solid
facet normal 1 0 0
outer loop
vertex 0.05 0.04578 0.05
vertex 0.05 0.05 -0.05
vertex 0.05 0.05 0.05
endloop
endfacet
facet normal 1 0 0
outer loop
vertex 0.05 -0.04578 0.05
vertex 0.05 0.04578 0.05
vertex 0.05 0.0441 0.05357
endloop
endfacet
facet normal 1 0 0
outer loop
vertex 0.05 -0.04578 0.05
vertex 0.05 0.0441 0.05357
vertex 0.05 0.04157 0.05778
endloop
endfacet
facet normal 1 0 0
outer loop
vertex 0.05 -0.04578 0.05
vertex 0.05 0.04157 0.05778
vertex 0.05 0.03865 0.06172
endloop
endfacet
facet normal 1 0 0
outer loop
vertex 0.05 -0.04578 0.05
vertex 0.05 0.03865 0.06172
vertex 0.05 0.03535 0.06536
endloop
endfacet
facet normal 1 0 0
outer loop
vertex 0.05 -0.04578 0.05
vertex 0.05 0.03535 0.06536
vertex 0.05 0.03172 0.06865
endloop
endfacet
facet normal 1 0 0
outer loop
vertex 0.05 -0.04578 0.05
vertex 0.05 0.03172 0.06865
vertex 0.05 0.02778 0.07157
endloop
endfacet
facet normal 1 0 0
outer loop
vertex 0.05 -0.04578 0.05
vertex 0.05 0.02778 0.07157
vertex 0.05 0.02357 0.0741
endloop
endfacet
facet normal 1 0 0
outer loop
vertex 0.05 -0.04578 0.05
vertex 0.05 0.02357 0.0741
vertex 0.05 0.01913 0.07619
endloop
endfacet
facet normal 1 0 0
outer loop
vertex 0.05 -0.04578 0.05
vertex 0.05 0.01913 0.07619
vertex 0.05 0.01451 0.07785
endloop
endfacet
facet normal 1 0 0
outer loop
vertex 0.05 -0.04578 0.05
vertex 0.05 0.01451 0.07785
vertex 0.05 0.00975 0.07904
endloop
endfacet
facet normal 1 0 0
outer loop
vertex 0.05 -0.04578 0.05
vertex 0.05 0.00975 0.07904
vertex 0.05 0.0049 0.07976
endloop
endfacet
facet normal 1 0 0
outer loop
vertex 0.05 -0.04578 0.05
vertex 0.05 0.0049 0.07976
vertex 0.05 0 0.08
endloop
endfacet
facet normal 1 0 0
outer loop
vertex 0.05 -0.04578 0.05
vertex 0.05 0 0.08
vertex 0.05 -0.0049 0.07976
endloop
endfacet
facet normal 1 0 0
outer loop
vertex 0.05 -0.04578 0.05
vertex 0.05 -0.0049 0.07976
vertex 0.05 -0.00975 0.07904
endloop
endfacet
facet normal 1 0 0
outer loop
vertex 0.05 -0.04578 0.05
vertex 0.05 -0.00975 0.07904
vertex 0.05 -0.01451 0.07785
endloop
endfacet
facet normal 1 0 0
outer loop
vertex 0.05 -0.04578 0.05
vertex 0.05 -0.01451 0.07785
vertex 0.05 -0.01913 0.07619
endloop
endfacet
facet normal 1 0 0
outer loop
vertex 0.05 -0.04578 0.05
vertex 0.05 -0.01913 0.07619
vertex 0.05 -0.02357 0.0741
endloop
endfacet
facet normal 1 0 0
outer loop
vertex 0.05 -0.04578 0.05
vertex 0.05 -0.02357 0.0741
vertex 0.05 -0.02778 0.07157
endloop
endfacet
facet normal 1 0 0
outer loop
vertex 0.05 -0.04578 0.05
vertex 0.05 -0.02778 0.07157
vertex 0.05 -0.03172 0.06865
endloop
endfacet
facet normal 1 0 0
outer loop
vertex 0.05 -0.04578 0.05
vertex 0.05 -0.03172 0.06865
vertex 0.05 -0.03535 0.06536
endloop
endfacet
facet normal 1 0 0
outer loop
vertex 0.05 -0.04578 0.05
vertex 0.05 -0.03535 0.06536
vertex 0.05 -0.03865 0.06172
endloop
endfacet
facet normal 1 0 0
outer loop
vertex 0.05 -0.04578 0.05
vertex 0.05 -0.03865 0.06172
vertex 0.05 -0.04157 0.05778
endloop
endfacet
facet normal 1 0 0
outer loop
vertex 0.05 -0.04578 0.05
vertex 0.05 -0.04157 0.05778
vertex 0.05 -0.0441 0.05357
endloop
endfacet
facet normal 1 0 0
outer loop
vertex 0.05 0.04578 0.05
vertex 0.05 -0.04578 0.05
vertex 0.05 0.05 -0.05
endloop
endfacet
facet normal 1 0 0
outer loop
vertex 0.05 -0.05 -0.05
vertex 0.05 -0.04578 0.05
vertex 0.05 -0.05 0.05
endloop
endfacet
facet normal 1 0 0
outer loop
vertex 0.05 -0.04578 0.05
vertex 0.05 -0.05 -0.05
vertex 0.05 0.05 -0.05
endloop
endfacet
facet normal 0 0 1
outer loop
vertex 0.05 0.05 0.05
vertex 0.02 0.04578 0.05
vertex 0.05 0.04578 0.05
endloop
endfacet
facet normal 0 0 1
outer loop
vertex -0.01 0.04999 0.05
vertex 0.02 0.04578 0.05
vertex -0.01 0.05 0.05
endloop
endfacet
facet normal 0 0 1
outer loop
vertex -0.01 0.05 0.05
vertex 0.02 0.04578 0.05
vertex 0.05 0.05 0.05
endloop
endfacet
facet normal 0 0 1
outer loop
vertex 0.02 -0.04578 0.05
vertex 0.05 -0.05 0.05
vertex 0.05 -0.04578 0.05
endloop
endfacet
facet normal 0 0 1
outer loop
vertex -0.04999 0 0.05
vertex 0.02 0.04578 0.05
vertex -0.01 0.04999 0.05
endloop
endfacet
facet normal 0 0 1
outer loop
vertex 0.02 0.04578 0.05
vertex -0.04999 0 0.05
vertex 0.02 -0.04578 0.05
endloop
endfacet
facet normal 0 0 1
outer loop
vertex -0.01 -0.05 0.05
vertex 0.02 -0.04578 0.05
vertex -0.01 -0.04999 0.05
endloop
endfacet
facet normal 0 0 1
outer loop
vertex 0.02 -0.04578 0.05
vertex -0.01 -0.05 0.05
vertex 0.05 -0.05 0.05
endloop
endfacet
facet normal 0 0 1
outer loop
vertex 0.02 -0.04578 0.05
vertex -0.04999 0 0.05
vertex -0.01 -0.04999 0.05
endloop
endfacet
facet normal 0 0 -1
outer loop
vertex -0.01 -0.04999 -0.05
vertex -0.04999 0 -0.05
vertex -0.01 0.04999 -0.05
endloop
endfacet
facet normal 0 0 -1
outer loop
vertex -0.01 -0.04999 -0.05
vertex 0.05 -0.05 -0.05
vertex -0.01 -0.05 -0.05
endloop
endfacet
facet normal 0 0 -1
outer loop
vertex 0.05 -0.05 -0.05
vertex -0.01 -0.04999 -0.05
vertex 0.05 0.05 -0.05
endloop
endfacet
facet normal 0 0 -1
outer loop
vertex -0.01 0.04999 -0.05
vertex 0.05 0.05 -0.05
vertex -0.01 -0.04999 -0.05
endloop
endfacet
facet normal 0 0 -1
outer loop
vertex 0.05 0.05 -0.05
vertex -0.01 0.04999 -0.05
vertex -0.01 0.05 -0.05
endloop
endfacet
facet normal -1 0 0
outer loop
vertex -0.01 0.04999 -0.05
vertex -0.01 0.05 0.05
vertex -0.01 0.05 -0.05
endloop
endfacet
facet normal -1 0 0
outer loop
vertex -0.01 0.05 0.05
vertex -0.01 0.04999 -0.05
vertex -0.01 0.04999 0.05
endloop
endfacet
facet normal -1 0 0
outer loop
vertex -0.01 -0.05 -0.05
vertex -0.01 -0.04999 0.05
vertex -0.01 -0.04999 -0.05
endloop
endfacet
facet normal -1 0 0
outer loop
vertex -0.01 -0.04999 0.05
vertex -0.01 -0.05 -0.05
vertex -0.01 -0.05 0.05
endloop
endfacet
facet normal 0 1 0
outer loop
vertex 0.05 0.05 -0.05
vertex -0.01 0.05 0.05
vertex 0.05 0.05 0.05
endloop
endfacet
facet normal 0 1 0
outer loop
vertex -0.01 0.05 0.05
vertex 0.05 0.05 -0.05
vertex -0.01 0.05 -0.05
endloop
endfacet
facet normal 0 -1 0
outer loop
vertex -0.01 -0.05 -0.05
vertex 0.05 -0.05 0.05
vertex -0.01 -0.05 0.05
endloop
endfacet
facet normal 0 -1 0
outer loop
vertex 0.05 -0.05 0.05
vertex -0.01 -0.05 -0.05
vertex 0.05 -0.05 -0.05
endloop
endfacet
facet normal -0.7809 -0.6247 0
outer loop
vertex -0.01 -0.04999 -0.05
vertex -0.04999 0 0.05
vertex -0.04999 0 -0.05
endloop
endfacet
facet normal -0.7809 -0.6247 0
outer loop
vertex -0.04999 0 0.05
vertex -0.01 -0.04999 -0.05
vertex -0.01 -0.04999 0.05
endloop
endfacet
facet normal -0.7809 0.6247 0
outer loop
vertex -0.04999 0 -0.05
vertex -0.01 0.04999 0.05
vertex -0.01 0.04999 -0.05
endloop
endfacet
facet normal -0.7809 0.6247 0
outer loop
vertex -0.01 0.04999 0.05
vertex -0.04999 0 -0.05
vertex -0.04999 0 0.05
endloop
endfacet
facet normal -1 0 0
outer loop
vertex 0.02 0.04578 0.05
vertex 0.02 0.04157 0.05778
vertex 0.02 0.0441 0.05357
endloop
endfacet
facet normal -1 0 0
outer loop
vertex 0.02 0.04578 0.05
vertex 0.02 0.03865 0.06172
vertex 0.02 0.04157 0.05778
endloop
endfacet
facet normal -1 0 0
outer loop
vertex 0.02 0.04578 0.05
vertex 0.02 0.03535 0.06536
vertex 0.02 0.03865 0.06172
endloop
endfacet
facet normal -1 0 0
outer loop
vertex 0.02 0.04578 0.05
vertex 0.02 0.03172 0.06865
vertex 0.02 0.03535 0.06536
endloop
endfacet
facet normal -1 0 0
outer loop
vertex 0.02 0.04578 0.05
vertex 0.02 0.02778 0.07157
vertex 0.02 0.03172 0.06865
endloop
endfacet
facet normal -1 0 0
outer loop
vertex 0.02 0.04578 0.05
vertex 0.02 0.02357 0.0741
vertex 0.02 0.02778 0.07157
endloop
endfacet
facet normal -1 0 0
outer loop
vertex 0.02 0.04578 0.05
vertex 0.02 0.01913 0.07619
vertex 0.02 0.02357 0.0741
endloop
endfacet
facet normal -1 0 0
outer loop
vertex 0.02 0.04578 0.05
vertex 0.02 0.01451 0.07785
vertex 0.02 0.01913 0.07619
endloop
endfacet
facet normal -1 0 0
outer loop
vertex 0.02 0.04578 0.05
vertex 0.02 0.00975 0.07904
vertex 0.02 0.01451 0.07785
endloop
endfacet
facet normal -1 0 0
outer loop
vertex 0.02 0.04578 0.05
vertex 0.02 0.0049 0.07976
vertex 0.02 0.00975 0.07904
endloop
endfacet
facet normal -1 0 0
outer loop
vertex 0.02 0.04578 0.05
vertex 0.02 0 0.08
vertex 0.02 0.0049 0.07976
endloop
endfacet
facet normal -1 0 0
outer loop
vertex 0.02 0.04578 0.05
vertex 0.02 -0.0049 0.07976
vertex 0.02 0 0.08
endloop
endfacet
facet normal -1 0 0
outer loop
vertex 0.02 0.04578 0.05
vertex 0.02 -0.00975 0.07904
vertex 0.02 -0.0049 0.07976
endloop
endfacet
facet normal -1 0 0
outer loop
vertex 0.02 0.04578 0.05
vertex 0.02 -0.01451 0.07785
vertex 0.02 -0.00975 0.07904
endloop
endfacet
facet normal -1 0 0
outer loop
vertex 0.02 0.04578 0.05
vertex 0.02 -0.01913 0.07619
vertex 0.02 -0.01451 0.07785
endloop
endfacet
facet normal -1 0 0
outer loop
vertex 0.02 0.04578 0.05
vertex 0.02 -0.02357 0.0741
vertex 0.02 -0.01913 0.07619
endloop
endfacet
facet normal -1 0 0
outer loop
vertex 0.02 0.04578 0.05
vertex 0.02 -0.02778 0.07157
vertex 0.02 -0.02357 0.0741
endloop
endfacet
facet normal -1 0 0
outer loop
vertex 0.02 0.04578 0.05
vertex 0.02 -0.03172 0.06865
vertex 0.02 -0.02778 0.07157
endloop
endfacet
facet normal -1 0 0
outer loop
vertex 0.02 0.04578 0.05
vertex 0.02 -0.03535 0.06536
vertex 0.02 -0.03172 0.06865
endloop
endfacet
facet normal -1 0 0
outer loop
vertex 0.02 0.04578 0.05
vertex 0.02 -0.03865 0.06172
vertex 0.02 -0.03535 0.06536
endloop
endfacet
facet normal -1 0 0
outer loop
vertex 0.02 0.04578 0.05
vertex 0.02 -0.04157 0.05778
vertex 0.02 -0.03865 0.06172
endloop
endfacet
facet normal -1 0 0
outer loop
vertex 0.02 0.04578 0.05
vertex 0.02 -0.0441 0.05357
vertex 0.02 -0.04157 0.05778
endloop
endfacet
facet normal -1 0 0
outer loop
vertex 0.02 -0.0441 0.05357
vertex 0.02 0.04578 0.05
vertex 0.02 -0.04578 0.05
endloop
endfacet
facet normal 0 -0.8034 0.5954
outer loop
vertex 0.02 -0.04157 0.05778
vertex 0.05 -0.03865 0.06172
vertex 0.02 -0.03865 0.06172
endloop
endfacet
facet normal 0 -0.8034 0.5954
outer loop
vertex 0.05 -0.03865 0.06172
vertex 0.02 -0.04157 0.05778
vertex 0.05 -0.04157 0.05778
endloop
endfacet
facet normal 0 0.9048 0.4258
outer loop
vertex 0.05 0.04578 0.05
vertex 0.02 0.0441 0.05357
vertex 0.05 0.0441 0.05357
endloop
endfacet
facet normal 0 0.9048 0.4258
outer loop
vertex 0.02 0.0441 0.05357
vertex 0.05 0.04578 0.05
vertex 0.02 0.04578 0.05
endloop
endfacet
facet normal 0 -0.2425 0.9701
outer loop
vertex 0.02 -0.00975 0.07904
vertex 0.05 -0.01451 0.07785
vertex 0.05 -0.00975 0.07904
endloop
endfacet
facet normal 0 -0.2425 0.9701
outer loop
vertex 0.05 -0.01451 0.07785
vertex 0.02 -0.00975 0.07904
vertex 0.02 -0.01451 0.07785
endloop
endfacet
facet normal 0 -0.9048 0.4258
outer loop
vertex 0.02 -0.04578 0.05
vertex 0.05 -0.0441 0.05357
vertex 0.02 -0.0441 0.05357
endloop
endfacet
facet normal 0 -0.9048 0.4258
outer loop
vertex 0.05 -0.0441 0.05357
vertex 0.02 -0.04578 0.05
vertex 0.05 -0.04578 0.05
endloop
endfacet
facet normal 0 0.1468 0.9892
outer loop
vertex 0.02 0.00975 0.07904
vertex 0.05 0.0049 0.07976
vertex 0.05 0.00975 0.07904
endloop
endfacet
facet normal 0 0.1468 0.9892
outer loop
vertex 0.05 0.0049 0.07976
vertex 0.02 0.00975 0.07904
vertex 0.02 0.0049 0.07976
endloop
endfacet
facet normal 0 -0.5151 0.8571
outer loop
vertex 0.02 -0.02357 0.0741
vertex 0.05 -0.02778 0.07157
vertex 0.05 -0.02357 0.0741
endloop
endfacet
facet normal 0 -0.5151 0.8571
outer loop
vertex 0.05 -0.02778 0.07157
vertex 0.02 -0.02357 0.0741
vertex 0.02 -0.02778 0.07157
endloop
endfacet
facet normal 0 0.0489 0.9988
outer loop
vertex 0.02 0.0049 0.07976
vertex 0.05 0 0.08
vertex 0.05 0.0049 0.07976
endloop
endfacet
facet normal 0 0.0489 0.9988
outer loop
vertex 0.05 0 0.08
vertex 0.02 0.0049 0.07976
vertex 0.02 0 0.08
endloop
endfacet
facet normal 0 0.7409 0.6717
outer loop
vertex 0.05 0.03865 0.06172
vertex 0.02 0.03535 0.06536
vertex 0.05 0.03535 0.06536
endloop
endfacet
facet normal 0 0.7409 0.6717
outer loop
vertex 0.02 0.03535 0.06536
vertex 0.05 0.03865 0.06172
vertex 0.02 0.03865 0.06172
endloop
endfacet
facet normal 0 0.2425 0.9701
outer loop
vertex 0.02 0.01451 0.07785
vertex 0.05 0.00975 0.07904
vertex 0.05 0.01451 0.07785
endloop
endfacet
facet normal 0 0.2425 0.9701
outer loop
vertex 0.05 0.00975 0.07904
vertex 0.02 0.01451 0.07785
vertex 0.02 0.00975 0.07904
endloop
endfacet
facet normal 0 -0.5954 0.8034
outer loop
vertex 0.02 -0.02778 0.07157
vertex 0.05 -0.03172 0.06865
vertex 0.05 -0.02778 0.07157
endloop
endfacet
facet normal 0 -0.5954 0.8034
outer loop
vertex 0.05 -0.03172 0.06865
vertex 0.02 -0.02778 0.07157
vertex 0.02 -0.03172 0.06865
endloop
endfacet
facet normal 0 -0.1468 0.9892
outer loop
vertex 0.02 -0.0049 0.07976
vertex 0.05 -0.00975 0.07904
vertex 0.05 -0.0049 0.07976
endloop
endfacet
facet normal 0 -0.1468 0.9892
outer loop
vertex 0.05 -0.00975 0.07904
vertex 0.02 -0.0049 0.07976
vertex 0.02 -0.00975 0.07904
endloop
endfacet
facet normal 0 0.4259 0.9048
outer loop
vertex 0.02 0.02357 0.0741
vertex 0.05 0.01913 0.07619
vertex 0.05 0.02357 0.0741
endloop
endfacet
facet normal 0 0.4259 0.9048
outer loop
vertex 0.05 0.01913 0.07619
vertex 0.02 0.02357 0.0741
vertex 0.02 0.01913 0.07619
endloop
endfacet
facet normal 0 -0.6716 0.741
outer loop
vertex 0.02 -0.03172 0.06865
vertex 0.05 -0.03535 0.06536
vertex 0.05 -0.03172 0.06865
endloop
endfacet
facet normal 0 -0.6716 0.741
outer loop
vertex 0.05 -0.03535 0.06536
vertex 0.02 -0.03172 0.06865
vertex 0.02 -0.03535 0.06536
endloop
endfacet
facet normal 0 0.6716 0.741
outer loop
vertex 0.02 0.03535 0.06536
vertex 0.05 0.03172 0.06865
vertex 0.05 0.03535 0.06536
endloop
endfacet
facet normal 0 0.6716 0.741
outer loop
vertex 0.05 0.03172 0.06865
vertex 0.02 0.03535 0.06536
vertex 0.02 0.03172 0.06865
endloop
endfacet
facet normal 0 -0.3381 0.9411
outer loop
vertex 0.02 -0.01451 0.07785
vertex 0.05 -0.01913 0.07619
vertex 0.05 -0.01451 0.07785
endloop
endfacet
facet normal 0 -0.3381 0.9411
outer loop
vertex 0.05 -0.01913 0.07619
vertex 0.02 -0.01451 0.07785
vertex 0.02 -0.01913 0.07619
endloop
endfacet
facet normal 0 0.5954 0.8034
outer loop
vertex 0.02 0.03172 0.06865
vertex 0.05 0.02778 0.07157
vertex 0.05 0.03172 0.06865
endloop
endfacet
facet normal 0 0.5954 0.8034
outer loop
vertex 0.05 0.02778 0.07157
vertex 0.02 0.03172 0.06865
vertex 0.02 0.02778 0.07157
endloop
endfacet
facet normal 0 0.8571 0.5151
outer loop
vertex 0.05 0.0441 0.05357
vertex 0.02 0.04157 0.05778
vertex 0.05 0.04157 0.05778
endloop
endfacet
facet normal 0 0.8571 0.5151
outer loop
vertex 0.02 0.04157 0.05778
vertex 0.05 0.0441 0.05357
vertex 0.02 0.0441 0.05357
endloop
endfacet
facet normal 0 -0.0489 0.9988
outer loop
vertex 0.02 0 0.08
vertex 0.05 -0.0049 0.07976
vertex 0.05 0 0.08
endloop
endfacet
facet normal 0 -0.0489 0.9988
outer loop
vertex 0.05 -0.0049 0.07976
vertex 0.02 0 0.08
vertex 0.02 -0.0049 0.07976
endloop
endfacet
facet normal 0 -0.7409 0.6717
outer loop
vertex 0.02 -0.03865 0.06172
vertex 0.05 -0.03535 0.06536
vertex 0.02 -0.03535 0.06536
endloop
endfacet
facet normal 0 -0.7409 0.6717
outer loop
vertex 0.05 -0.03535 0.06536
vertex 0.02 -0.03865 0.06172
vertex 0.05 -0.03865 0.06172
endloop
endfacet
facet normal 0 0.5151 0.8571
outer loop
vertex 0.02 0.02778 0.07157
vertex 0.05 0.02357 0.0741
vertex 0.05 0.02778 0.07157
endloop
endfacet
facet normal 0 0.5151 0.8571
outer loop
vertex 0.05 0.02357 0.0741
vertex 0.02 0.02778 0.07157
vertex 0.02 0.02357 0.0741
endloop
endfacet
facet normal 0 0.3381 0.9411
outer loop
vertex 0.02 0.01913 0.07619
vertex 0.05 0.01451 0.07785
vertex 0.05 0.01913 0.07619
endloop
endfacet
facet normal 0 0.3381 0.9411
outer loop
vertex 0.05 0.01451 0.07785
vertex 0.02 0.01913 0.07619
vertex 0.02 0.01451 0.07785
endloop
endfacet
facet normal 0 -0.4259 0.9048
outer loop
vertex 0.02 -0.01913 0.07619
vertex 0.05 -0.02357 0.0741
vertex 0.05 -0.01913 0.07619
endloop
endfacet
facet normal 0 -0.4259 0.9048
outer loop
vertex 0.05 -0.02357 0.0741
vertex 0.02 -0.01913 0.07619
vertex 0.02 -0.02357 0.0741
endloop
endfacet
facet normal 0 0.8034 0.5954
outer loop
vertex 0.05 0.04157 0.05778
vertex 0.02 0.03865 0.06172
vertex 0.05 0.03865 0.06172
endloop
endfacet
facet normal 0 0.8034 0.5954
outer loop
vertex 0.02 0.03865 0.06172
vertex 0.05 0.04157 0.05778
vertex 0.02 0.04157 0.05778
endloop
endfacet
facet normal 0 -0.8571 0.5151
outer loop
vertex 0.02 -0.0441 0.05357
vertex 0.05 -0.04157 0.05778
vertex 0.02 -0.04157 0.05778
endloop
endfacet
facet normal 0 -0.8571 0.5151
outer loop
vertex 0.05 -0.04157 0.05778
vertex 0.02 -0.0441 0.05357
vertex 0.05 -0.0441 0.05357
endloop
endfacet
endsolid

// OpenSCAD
$fn=64;

L = 0.1;
W = 0.1;
H = 0.1;

wedge_len = 0.04;
body_len  = L - wedge_len;

clevis_len = 0.03;
arm_thk = 0.02;
gap_w = 0.03;
arm_h = 0.06;

module wedge_body(len_body, len_wedge, w, h){
    union(){
        translate([-(L/2) + len_wedge + len_body/2, 0, 0])
            cube([len_body, w, h], center=true);

        translate([-(L/2) + len_wedge, 0, 0])
            linear_extrude(height=h, center=true)
                polygon(points=[
                    [0, -w/2],
                    [0,  w/2],
                    [-len_wedge, 0]
                ]);
    }
}

module clevis_feature(len_c, w_total, h_total, arm_t, gap){
    difference(){
        union(){
            translate([L/2 - len_c/2, 0, 0])
                cube([len_c, w_total, h_total], center=true);

            translate([L/2 - len_c/2, 0, h_total/2])
                rotate([0,90,0])
                    cylinder(h=len_c, r=w_total/2, center=true);
        }

        translate([L/2 - len_c/2, 0, 0])
            cube([len_c+0.002, gap, h_total+0.002], center=true);

        translate([L/2 - len_c/2, 0, h_total/2])
            rotate([0,90,0])
                cylinder(h=len_c+0.002, r=gap/2, center=true);

        translate([L/2 - len_c/2, 0, 0])
            rotate([0,90,0])
                cylinder(h=len_c+0.004, r=0.012, center=true);
    }
}

union(){
    wedge_body(body_len, wedge_len, W, H);

    translate([0,0,0])
        clevis_feature(clevis_len, W, arm_h, arm_thk, gap_w);
}
